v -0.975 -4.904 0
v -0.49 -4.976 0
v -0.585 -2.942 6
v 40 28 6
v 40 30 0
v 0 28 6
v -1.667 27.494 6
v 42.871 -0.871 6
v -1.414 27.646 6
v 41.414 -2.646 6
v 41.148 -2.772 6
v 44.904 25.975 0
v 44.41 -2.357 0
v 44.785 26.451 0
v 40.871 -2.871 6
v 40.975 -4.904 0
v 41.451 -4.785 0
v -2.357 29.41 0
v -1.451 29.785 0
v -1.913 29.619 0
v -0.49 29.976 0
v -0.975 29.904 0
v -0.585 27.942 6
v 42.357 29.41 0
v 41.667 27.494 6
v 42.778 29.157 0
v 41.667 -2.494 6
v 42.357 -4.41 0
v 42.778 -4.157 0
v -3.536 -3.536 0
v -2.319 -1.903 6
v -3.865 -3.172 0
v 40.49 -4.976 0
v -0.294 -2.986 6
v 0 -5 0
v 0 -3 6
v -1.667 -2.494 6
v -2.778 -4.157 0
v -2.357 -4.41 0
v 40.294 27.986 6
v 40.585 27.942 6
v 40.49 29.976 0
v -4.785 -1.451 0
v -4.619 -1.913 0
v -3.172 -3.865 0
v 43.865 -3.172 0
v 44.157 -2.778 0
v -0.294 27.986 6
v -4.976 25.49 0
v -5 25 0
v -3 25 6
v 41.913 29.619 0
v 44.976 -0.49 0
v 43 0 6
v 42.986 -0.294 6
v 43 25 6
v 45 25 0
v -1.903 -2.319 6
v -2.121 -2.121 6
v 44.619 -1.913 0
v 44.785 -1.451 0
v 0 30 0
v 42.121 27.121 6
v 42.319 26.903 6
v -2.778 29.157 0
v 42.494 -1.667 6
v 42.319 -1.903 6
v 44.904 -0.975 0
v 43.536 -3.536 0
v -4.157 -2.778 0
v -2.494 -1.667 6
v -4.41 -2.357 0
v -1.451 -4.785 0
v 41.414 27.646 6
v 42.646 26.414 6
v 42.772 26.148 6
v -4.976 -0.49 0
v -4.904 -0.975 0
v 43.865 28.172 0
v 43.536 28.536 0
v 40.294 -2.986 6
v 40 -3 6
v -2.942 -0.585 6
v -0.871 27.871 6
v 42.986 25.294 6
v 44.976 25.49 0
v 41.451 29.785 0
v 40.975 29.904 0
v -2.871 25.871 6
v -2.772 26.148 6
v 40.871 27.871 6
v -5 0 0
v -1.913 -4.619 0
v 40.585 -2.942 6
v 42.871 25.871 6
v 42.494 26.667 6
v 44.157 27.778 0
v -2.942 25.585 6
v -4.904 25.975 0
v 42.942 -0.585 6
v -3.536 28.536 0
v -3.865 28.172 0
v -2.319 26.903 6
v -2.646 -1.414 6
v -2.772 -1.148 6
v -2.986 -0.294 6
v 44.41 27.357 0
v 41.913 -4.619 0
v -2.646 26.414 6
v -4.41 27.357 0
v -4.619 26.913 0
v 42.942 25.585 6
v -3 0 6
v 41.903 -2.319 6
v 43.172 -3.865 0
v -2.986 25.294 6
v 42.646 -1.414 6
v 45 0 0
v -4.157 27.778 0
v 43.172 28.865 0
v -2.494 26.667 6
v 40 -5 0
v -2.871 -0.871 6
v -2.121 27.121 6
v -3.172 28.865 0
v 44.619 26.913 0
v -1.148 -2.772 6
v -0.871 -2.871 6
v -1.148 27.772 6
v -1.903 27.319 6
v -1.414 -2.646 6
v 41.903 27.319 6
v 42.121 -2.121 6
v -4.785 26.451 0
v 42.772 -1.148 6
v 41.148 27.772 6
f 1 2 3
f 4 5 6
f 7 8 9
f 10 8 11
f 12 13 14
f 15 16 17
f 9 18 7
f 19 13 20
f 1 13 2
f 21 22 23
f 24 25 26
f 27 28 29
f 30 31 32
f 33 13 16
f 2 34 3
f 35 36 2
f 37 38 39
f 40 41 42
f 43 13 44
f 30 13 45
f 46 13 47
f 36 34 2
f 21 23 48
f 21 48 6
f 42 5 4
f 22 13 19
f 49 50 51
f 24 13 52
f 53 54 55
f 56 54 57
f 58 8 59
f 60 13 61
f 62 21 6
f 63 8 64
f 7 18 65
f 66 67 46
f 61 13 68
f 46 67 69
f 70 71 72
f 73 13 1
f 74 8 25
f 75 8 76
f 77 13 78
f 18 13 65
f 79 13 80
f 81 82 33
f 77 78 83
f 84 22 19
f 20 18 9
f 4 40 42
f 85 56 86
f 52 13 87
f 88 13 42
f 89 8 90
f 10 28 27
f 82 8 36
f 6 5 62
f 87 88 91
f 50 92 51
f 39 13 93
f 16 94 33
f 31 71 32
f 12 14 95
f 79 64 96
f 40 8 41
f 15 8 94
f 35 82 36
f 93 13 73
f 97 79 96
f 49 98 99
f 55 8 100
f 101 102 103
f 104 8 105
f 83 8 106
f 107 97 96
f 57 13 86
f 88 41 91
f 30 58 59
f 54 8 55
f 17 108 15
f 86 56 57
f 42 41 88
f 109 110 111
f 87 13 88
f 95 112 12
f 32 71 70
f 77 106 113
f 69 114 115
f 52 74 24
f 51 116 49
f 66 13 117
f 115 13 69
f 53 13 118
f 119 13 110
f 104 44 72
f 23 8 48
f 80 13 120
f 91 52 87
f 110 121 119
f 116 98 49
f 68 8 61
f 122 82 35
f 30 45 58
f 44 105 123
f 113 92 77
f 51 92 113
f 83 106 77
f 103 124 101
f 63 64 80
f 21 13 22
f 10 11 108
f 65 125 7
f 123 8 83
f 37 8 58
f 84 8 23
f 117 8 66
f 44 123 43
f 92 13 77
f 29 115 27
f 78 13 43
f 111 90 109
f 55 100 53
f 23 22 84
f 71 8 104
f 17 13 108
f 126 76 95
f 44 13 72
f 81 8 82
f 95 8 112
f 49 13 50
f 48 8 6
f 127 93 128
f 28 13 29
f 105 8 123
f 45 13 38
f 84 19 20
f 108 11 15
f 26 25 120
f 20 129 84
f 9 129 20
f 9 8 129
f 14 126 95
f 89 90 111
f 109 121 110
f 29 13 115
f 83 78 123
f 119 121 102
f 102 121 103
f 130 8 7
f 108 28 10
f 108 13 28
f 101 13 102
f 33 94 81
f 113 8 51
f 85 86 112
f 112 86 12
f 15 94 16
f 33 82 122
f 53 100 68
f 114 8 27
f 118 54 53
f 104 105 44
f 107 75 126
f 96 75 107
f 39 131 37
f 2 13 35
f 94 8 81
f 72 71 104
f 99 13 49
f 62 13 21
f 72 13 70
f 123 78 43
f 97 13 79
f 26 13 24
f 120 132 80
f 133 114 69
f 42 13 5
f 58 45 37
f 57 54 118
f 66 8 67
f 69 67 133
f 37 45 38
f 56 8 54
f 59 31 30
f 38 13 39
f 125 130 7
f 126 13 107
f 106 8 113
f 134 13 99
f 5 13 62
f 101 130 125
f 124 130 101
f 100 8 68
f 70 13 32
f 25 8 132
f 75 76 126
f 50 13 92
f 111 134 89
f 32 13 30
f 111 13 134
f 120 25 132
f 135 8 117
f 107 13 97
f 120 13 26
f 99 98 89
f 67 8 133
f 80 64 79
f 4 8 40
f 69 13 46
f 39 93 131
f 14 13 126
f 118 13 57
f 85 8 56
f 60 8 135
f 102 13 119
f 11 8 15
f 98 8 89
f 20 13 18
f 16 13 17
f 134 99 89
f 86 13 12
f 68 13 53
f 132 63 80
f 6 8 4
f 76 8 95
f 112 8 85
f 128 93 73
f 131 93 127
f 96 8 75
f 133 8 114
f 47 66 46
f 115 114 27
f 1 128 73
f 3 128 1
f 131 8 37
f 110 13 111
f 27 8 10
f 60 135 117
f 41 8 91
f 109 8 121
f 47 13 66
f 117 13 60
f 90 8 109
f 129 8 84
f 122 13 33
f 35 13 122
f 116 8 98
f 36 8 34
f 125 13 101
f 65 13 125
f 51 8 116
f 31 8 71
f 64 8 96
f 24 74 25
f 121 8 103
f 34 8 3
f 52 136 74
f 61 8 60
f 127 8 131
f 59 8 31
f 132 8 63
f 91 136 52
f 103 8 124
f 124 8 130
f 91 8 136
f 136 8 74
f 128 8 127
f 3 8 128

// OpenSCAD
hull() for (x = [0, 40], y = [0, 25]) translate([x, y, 0]) cylinder(h = 6, r1 = 5, r2 = 3, $fn = 64);
